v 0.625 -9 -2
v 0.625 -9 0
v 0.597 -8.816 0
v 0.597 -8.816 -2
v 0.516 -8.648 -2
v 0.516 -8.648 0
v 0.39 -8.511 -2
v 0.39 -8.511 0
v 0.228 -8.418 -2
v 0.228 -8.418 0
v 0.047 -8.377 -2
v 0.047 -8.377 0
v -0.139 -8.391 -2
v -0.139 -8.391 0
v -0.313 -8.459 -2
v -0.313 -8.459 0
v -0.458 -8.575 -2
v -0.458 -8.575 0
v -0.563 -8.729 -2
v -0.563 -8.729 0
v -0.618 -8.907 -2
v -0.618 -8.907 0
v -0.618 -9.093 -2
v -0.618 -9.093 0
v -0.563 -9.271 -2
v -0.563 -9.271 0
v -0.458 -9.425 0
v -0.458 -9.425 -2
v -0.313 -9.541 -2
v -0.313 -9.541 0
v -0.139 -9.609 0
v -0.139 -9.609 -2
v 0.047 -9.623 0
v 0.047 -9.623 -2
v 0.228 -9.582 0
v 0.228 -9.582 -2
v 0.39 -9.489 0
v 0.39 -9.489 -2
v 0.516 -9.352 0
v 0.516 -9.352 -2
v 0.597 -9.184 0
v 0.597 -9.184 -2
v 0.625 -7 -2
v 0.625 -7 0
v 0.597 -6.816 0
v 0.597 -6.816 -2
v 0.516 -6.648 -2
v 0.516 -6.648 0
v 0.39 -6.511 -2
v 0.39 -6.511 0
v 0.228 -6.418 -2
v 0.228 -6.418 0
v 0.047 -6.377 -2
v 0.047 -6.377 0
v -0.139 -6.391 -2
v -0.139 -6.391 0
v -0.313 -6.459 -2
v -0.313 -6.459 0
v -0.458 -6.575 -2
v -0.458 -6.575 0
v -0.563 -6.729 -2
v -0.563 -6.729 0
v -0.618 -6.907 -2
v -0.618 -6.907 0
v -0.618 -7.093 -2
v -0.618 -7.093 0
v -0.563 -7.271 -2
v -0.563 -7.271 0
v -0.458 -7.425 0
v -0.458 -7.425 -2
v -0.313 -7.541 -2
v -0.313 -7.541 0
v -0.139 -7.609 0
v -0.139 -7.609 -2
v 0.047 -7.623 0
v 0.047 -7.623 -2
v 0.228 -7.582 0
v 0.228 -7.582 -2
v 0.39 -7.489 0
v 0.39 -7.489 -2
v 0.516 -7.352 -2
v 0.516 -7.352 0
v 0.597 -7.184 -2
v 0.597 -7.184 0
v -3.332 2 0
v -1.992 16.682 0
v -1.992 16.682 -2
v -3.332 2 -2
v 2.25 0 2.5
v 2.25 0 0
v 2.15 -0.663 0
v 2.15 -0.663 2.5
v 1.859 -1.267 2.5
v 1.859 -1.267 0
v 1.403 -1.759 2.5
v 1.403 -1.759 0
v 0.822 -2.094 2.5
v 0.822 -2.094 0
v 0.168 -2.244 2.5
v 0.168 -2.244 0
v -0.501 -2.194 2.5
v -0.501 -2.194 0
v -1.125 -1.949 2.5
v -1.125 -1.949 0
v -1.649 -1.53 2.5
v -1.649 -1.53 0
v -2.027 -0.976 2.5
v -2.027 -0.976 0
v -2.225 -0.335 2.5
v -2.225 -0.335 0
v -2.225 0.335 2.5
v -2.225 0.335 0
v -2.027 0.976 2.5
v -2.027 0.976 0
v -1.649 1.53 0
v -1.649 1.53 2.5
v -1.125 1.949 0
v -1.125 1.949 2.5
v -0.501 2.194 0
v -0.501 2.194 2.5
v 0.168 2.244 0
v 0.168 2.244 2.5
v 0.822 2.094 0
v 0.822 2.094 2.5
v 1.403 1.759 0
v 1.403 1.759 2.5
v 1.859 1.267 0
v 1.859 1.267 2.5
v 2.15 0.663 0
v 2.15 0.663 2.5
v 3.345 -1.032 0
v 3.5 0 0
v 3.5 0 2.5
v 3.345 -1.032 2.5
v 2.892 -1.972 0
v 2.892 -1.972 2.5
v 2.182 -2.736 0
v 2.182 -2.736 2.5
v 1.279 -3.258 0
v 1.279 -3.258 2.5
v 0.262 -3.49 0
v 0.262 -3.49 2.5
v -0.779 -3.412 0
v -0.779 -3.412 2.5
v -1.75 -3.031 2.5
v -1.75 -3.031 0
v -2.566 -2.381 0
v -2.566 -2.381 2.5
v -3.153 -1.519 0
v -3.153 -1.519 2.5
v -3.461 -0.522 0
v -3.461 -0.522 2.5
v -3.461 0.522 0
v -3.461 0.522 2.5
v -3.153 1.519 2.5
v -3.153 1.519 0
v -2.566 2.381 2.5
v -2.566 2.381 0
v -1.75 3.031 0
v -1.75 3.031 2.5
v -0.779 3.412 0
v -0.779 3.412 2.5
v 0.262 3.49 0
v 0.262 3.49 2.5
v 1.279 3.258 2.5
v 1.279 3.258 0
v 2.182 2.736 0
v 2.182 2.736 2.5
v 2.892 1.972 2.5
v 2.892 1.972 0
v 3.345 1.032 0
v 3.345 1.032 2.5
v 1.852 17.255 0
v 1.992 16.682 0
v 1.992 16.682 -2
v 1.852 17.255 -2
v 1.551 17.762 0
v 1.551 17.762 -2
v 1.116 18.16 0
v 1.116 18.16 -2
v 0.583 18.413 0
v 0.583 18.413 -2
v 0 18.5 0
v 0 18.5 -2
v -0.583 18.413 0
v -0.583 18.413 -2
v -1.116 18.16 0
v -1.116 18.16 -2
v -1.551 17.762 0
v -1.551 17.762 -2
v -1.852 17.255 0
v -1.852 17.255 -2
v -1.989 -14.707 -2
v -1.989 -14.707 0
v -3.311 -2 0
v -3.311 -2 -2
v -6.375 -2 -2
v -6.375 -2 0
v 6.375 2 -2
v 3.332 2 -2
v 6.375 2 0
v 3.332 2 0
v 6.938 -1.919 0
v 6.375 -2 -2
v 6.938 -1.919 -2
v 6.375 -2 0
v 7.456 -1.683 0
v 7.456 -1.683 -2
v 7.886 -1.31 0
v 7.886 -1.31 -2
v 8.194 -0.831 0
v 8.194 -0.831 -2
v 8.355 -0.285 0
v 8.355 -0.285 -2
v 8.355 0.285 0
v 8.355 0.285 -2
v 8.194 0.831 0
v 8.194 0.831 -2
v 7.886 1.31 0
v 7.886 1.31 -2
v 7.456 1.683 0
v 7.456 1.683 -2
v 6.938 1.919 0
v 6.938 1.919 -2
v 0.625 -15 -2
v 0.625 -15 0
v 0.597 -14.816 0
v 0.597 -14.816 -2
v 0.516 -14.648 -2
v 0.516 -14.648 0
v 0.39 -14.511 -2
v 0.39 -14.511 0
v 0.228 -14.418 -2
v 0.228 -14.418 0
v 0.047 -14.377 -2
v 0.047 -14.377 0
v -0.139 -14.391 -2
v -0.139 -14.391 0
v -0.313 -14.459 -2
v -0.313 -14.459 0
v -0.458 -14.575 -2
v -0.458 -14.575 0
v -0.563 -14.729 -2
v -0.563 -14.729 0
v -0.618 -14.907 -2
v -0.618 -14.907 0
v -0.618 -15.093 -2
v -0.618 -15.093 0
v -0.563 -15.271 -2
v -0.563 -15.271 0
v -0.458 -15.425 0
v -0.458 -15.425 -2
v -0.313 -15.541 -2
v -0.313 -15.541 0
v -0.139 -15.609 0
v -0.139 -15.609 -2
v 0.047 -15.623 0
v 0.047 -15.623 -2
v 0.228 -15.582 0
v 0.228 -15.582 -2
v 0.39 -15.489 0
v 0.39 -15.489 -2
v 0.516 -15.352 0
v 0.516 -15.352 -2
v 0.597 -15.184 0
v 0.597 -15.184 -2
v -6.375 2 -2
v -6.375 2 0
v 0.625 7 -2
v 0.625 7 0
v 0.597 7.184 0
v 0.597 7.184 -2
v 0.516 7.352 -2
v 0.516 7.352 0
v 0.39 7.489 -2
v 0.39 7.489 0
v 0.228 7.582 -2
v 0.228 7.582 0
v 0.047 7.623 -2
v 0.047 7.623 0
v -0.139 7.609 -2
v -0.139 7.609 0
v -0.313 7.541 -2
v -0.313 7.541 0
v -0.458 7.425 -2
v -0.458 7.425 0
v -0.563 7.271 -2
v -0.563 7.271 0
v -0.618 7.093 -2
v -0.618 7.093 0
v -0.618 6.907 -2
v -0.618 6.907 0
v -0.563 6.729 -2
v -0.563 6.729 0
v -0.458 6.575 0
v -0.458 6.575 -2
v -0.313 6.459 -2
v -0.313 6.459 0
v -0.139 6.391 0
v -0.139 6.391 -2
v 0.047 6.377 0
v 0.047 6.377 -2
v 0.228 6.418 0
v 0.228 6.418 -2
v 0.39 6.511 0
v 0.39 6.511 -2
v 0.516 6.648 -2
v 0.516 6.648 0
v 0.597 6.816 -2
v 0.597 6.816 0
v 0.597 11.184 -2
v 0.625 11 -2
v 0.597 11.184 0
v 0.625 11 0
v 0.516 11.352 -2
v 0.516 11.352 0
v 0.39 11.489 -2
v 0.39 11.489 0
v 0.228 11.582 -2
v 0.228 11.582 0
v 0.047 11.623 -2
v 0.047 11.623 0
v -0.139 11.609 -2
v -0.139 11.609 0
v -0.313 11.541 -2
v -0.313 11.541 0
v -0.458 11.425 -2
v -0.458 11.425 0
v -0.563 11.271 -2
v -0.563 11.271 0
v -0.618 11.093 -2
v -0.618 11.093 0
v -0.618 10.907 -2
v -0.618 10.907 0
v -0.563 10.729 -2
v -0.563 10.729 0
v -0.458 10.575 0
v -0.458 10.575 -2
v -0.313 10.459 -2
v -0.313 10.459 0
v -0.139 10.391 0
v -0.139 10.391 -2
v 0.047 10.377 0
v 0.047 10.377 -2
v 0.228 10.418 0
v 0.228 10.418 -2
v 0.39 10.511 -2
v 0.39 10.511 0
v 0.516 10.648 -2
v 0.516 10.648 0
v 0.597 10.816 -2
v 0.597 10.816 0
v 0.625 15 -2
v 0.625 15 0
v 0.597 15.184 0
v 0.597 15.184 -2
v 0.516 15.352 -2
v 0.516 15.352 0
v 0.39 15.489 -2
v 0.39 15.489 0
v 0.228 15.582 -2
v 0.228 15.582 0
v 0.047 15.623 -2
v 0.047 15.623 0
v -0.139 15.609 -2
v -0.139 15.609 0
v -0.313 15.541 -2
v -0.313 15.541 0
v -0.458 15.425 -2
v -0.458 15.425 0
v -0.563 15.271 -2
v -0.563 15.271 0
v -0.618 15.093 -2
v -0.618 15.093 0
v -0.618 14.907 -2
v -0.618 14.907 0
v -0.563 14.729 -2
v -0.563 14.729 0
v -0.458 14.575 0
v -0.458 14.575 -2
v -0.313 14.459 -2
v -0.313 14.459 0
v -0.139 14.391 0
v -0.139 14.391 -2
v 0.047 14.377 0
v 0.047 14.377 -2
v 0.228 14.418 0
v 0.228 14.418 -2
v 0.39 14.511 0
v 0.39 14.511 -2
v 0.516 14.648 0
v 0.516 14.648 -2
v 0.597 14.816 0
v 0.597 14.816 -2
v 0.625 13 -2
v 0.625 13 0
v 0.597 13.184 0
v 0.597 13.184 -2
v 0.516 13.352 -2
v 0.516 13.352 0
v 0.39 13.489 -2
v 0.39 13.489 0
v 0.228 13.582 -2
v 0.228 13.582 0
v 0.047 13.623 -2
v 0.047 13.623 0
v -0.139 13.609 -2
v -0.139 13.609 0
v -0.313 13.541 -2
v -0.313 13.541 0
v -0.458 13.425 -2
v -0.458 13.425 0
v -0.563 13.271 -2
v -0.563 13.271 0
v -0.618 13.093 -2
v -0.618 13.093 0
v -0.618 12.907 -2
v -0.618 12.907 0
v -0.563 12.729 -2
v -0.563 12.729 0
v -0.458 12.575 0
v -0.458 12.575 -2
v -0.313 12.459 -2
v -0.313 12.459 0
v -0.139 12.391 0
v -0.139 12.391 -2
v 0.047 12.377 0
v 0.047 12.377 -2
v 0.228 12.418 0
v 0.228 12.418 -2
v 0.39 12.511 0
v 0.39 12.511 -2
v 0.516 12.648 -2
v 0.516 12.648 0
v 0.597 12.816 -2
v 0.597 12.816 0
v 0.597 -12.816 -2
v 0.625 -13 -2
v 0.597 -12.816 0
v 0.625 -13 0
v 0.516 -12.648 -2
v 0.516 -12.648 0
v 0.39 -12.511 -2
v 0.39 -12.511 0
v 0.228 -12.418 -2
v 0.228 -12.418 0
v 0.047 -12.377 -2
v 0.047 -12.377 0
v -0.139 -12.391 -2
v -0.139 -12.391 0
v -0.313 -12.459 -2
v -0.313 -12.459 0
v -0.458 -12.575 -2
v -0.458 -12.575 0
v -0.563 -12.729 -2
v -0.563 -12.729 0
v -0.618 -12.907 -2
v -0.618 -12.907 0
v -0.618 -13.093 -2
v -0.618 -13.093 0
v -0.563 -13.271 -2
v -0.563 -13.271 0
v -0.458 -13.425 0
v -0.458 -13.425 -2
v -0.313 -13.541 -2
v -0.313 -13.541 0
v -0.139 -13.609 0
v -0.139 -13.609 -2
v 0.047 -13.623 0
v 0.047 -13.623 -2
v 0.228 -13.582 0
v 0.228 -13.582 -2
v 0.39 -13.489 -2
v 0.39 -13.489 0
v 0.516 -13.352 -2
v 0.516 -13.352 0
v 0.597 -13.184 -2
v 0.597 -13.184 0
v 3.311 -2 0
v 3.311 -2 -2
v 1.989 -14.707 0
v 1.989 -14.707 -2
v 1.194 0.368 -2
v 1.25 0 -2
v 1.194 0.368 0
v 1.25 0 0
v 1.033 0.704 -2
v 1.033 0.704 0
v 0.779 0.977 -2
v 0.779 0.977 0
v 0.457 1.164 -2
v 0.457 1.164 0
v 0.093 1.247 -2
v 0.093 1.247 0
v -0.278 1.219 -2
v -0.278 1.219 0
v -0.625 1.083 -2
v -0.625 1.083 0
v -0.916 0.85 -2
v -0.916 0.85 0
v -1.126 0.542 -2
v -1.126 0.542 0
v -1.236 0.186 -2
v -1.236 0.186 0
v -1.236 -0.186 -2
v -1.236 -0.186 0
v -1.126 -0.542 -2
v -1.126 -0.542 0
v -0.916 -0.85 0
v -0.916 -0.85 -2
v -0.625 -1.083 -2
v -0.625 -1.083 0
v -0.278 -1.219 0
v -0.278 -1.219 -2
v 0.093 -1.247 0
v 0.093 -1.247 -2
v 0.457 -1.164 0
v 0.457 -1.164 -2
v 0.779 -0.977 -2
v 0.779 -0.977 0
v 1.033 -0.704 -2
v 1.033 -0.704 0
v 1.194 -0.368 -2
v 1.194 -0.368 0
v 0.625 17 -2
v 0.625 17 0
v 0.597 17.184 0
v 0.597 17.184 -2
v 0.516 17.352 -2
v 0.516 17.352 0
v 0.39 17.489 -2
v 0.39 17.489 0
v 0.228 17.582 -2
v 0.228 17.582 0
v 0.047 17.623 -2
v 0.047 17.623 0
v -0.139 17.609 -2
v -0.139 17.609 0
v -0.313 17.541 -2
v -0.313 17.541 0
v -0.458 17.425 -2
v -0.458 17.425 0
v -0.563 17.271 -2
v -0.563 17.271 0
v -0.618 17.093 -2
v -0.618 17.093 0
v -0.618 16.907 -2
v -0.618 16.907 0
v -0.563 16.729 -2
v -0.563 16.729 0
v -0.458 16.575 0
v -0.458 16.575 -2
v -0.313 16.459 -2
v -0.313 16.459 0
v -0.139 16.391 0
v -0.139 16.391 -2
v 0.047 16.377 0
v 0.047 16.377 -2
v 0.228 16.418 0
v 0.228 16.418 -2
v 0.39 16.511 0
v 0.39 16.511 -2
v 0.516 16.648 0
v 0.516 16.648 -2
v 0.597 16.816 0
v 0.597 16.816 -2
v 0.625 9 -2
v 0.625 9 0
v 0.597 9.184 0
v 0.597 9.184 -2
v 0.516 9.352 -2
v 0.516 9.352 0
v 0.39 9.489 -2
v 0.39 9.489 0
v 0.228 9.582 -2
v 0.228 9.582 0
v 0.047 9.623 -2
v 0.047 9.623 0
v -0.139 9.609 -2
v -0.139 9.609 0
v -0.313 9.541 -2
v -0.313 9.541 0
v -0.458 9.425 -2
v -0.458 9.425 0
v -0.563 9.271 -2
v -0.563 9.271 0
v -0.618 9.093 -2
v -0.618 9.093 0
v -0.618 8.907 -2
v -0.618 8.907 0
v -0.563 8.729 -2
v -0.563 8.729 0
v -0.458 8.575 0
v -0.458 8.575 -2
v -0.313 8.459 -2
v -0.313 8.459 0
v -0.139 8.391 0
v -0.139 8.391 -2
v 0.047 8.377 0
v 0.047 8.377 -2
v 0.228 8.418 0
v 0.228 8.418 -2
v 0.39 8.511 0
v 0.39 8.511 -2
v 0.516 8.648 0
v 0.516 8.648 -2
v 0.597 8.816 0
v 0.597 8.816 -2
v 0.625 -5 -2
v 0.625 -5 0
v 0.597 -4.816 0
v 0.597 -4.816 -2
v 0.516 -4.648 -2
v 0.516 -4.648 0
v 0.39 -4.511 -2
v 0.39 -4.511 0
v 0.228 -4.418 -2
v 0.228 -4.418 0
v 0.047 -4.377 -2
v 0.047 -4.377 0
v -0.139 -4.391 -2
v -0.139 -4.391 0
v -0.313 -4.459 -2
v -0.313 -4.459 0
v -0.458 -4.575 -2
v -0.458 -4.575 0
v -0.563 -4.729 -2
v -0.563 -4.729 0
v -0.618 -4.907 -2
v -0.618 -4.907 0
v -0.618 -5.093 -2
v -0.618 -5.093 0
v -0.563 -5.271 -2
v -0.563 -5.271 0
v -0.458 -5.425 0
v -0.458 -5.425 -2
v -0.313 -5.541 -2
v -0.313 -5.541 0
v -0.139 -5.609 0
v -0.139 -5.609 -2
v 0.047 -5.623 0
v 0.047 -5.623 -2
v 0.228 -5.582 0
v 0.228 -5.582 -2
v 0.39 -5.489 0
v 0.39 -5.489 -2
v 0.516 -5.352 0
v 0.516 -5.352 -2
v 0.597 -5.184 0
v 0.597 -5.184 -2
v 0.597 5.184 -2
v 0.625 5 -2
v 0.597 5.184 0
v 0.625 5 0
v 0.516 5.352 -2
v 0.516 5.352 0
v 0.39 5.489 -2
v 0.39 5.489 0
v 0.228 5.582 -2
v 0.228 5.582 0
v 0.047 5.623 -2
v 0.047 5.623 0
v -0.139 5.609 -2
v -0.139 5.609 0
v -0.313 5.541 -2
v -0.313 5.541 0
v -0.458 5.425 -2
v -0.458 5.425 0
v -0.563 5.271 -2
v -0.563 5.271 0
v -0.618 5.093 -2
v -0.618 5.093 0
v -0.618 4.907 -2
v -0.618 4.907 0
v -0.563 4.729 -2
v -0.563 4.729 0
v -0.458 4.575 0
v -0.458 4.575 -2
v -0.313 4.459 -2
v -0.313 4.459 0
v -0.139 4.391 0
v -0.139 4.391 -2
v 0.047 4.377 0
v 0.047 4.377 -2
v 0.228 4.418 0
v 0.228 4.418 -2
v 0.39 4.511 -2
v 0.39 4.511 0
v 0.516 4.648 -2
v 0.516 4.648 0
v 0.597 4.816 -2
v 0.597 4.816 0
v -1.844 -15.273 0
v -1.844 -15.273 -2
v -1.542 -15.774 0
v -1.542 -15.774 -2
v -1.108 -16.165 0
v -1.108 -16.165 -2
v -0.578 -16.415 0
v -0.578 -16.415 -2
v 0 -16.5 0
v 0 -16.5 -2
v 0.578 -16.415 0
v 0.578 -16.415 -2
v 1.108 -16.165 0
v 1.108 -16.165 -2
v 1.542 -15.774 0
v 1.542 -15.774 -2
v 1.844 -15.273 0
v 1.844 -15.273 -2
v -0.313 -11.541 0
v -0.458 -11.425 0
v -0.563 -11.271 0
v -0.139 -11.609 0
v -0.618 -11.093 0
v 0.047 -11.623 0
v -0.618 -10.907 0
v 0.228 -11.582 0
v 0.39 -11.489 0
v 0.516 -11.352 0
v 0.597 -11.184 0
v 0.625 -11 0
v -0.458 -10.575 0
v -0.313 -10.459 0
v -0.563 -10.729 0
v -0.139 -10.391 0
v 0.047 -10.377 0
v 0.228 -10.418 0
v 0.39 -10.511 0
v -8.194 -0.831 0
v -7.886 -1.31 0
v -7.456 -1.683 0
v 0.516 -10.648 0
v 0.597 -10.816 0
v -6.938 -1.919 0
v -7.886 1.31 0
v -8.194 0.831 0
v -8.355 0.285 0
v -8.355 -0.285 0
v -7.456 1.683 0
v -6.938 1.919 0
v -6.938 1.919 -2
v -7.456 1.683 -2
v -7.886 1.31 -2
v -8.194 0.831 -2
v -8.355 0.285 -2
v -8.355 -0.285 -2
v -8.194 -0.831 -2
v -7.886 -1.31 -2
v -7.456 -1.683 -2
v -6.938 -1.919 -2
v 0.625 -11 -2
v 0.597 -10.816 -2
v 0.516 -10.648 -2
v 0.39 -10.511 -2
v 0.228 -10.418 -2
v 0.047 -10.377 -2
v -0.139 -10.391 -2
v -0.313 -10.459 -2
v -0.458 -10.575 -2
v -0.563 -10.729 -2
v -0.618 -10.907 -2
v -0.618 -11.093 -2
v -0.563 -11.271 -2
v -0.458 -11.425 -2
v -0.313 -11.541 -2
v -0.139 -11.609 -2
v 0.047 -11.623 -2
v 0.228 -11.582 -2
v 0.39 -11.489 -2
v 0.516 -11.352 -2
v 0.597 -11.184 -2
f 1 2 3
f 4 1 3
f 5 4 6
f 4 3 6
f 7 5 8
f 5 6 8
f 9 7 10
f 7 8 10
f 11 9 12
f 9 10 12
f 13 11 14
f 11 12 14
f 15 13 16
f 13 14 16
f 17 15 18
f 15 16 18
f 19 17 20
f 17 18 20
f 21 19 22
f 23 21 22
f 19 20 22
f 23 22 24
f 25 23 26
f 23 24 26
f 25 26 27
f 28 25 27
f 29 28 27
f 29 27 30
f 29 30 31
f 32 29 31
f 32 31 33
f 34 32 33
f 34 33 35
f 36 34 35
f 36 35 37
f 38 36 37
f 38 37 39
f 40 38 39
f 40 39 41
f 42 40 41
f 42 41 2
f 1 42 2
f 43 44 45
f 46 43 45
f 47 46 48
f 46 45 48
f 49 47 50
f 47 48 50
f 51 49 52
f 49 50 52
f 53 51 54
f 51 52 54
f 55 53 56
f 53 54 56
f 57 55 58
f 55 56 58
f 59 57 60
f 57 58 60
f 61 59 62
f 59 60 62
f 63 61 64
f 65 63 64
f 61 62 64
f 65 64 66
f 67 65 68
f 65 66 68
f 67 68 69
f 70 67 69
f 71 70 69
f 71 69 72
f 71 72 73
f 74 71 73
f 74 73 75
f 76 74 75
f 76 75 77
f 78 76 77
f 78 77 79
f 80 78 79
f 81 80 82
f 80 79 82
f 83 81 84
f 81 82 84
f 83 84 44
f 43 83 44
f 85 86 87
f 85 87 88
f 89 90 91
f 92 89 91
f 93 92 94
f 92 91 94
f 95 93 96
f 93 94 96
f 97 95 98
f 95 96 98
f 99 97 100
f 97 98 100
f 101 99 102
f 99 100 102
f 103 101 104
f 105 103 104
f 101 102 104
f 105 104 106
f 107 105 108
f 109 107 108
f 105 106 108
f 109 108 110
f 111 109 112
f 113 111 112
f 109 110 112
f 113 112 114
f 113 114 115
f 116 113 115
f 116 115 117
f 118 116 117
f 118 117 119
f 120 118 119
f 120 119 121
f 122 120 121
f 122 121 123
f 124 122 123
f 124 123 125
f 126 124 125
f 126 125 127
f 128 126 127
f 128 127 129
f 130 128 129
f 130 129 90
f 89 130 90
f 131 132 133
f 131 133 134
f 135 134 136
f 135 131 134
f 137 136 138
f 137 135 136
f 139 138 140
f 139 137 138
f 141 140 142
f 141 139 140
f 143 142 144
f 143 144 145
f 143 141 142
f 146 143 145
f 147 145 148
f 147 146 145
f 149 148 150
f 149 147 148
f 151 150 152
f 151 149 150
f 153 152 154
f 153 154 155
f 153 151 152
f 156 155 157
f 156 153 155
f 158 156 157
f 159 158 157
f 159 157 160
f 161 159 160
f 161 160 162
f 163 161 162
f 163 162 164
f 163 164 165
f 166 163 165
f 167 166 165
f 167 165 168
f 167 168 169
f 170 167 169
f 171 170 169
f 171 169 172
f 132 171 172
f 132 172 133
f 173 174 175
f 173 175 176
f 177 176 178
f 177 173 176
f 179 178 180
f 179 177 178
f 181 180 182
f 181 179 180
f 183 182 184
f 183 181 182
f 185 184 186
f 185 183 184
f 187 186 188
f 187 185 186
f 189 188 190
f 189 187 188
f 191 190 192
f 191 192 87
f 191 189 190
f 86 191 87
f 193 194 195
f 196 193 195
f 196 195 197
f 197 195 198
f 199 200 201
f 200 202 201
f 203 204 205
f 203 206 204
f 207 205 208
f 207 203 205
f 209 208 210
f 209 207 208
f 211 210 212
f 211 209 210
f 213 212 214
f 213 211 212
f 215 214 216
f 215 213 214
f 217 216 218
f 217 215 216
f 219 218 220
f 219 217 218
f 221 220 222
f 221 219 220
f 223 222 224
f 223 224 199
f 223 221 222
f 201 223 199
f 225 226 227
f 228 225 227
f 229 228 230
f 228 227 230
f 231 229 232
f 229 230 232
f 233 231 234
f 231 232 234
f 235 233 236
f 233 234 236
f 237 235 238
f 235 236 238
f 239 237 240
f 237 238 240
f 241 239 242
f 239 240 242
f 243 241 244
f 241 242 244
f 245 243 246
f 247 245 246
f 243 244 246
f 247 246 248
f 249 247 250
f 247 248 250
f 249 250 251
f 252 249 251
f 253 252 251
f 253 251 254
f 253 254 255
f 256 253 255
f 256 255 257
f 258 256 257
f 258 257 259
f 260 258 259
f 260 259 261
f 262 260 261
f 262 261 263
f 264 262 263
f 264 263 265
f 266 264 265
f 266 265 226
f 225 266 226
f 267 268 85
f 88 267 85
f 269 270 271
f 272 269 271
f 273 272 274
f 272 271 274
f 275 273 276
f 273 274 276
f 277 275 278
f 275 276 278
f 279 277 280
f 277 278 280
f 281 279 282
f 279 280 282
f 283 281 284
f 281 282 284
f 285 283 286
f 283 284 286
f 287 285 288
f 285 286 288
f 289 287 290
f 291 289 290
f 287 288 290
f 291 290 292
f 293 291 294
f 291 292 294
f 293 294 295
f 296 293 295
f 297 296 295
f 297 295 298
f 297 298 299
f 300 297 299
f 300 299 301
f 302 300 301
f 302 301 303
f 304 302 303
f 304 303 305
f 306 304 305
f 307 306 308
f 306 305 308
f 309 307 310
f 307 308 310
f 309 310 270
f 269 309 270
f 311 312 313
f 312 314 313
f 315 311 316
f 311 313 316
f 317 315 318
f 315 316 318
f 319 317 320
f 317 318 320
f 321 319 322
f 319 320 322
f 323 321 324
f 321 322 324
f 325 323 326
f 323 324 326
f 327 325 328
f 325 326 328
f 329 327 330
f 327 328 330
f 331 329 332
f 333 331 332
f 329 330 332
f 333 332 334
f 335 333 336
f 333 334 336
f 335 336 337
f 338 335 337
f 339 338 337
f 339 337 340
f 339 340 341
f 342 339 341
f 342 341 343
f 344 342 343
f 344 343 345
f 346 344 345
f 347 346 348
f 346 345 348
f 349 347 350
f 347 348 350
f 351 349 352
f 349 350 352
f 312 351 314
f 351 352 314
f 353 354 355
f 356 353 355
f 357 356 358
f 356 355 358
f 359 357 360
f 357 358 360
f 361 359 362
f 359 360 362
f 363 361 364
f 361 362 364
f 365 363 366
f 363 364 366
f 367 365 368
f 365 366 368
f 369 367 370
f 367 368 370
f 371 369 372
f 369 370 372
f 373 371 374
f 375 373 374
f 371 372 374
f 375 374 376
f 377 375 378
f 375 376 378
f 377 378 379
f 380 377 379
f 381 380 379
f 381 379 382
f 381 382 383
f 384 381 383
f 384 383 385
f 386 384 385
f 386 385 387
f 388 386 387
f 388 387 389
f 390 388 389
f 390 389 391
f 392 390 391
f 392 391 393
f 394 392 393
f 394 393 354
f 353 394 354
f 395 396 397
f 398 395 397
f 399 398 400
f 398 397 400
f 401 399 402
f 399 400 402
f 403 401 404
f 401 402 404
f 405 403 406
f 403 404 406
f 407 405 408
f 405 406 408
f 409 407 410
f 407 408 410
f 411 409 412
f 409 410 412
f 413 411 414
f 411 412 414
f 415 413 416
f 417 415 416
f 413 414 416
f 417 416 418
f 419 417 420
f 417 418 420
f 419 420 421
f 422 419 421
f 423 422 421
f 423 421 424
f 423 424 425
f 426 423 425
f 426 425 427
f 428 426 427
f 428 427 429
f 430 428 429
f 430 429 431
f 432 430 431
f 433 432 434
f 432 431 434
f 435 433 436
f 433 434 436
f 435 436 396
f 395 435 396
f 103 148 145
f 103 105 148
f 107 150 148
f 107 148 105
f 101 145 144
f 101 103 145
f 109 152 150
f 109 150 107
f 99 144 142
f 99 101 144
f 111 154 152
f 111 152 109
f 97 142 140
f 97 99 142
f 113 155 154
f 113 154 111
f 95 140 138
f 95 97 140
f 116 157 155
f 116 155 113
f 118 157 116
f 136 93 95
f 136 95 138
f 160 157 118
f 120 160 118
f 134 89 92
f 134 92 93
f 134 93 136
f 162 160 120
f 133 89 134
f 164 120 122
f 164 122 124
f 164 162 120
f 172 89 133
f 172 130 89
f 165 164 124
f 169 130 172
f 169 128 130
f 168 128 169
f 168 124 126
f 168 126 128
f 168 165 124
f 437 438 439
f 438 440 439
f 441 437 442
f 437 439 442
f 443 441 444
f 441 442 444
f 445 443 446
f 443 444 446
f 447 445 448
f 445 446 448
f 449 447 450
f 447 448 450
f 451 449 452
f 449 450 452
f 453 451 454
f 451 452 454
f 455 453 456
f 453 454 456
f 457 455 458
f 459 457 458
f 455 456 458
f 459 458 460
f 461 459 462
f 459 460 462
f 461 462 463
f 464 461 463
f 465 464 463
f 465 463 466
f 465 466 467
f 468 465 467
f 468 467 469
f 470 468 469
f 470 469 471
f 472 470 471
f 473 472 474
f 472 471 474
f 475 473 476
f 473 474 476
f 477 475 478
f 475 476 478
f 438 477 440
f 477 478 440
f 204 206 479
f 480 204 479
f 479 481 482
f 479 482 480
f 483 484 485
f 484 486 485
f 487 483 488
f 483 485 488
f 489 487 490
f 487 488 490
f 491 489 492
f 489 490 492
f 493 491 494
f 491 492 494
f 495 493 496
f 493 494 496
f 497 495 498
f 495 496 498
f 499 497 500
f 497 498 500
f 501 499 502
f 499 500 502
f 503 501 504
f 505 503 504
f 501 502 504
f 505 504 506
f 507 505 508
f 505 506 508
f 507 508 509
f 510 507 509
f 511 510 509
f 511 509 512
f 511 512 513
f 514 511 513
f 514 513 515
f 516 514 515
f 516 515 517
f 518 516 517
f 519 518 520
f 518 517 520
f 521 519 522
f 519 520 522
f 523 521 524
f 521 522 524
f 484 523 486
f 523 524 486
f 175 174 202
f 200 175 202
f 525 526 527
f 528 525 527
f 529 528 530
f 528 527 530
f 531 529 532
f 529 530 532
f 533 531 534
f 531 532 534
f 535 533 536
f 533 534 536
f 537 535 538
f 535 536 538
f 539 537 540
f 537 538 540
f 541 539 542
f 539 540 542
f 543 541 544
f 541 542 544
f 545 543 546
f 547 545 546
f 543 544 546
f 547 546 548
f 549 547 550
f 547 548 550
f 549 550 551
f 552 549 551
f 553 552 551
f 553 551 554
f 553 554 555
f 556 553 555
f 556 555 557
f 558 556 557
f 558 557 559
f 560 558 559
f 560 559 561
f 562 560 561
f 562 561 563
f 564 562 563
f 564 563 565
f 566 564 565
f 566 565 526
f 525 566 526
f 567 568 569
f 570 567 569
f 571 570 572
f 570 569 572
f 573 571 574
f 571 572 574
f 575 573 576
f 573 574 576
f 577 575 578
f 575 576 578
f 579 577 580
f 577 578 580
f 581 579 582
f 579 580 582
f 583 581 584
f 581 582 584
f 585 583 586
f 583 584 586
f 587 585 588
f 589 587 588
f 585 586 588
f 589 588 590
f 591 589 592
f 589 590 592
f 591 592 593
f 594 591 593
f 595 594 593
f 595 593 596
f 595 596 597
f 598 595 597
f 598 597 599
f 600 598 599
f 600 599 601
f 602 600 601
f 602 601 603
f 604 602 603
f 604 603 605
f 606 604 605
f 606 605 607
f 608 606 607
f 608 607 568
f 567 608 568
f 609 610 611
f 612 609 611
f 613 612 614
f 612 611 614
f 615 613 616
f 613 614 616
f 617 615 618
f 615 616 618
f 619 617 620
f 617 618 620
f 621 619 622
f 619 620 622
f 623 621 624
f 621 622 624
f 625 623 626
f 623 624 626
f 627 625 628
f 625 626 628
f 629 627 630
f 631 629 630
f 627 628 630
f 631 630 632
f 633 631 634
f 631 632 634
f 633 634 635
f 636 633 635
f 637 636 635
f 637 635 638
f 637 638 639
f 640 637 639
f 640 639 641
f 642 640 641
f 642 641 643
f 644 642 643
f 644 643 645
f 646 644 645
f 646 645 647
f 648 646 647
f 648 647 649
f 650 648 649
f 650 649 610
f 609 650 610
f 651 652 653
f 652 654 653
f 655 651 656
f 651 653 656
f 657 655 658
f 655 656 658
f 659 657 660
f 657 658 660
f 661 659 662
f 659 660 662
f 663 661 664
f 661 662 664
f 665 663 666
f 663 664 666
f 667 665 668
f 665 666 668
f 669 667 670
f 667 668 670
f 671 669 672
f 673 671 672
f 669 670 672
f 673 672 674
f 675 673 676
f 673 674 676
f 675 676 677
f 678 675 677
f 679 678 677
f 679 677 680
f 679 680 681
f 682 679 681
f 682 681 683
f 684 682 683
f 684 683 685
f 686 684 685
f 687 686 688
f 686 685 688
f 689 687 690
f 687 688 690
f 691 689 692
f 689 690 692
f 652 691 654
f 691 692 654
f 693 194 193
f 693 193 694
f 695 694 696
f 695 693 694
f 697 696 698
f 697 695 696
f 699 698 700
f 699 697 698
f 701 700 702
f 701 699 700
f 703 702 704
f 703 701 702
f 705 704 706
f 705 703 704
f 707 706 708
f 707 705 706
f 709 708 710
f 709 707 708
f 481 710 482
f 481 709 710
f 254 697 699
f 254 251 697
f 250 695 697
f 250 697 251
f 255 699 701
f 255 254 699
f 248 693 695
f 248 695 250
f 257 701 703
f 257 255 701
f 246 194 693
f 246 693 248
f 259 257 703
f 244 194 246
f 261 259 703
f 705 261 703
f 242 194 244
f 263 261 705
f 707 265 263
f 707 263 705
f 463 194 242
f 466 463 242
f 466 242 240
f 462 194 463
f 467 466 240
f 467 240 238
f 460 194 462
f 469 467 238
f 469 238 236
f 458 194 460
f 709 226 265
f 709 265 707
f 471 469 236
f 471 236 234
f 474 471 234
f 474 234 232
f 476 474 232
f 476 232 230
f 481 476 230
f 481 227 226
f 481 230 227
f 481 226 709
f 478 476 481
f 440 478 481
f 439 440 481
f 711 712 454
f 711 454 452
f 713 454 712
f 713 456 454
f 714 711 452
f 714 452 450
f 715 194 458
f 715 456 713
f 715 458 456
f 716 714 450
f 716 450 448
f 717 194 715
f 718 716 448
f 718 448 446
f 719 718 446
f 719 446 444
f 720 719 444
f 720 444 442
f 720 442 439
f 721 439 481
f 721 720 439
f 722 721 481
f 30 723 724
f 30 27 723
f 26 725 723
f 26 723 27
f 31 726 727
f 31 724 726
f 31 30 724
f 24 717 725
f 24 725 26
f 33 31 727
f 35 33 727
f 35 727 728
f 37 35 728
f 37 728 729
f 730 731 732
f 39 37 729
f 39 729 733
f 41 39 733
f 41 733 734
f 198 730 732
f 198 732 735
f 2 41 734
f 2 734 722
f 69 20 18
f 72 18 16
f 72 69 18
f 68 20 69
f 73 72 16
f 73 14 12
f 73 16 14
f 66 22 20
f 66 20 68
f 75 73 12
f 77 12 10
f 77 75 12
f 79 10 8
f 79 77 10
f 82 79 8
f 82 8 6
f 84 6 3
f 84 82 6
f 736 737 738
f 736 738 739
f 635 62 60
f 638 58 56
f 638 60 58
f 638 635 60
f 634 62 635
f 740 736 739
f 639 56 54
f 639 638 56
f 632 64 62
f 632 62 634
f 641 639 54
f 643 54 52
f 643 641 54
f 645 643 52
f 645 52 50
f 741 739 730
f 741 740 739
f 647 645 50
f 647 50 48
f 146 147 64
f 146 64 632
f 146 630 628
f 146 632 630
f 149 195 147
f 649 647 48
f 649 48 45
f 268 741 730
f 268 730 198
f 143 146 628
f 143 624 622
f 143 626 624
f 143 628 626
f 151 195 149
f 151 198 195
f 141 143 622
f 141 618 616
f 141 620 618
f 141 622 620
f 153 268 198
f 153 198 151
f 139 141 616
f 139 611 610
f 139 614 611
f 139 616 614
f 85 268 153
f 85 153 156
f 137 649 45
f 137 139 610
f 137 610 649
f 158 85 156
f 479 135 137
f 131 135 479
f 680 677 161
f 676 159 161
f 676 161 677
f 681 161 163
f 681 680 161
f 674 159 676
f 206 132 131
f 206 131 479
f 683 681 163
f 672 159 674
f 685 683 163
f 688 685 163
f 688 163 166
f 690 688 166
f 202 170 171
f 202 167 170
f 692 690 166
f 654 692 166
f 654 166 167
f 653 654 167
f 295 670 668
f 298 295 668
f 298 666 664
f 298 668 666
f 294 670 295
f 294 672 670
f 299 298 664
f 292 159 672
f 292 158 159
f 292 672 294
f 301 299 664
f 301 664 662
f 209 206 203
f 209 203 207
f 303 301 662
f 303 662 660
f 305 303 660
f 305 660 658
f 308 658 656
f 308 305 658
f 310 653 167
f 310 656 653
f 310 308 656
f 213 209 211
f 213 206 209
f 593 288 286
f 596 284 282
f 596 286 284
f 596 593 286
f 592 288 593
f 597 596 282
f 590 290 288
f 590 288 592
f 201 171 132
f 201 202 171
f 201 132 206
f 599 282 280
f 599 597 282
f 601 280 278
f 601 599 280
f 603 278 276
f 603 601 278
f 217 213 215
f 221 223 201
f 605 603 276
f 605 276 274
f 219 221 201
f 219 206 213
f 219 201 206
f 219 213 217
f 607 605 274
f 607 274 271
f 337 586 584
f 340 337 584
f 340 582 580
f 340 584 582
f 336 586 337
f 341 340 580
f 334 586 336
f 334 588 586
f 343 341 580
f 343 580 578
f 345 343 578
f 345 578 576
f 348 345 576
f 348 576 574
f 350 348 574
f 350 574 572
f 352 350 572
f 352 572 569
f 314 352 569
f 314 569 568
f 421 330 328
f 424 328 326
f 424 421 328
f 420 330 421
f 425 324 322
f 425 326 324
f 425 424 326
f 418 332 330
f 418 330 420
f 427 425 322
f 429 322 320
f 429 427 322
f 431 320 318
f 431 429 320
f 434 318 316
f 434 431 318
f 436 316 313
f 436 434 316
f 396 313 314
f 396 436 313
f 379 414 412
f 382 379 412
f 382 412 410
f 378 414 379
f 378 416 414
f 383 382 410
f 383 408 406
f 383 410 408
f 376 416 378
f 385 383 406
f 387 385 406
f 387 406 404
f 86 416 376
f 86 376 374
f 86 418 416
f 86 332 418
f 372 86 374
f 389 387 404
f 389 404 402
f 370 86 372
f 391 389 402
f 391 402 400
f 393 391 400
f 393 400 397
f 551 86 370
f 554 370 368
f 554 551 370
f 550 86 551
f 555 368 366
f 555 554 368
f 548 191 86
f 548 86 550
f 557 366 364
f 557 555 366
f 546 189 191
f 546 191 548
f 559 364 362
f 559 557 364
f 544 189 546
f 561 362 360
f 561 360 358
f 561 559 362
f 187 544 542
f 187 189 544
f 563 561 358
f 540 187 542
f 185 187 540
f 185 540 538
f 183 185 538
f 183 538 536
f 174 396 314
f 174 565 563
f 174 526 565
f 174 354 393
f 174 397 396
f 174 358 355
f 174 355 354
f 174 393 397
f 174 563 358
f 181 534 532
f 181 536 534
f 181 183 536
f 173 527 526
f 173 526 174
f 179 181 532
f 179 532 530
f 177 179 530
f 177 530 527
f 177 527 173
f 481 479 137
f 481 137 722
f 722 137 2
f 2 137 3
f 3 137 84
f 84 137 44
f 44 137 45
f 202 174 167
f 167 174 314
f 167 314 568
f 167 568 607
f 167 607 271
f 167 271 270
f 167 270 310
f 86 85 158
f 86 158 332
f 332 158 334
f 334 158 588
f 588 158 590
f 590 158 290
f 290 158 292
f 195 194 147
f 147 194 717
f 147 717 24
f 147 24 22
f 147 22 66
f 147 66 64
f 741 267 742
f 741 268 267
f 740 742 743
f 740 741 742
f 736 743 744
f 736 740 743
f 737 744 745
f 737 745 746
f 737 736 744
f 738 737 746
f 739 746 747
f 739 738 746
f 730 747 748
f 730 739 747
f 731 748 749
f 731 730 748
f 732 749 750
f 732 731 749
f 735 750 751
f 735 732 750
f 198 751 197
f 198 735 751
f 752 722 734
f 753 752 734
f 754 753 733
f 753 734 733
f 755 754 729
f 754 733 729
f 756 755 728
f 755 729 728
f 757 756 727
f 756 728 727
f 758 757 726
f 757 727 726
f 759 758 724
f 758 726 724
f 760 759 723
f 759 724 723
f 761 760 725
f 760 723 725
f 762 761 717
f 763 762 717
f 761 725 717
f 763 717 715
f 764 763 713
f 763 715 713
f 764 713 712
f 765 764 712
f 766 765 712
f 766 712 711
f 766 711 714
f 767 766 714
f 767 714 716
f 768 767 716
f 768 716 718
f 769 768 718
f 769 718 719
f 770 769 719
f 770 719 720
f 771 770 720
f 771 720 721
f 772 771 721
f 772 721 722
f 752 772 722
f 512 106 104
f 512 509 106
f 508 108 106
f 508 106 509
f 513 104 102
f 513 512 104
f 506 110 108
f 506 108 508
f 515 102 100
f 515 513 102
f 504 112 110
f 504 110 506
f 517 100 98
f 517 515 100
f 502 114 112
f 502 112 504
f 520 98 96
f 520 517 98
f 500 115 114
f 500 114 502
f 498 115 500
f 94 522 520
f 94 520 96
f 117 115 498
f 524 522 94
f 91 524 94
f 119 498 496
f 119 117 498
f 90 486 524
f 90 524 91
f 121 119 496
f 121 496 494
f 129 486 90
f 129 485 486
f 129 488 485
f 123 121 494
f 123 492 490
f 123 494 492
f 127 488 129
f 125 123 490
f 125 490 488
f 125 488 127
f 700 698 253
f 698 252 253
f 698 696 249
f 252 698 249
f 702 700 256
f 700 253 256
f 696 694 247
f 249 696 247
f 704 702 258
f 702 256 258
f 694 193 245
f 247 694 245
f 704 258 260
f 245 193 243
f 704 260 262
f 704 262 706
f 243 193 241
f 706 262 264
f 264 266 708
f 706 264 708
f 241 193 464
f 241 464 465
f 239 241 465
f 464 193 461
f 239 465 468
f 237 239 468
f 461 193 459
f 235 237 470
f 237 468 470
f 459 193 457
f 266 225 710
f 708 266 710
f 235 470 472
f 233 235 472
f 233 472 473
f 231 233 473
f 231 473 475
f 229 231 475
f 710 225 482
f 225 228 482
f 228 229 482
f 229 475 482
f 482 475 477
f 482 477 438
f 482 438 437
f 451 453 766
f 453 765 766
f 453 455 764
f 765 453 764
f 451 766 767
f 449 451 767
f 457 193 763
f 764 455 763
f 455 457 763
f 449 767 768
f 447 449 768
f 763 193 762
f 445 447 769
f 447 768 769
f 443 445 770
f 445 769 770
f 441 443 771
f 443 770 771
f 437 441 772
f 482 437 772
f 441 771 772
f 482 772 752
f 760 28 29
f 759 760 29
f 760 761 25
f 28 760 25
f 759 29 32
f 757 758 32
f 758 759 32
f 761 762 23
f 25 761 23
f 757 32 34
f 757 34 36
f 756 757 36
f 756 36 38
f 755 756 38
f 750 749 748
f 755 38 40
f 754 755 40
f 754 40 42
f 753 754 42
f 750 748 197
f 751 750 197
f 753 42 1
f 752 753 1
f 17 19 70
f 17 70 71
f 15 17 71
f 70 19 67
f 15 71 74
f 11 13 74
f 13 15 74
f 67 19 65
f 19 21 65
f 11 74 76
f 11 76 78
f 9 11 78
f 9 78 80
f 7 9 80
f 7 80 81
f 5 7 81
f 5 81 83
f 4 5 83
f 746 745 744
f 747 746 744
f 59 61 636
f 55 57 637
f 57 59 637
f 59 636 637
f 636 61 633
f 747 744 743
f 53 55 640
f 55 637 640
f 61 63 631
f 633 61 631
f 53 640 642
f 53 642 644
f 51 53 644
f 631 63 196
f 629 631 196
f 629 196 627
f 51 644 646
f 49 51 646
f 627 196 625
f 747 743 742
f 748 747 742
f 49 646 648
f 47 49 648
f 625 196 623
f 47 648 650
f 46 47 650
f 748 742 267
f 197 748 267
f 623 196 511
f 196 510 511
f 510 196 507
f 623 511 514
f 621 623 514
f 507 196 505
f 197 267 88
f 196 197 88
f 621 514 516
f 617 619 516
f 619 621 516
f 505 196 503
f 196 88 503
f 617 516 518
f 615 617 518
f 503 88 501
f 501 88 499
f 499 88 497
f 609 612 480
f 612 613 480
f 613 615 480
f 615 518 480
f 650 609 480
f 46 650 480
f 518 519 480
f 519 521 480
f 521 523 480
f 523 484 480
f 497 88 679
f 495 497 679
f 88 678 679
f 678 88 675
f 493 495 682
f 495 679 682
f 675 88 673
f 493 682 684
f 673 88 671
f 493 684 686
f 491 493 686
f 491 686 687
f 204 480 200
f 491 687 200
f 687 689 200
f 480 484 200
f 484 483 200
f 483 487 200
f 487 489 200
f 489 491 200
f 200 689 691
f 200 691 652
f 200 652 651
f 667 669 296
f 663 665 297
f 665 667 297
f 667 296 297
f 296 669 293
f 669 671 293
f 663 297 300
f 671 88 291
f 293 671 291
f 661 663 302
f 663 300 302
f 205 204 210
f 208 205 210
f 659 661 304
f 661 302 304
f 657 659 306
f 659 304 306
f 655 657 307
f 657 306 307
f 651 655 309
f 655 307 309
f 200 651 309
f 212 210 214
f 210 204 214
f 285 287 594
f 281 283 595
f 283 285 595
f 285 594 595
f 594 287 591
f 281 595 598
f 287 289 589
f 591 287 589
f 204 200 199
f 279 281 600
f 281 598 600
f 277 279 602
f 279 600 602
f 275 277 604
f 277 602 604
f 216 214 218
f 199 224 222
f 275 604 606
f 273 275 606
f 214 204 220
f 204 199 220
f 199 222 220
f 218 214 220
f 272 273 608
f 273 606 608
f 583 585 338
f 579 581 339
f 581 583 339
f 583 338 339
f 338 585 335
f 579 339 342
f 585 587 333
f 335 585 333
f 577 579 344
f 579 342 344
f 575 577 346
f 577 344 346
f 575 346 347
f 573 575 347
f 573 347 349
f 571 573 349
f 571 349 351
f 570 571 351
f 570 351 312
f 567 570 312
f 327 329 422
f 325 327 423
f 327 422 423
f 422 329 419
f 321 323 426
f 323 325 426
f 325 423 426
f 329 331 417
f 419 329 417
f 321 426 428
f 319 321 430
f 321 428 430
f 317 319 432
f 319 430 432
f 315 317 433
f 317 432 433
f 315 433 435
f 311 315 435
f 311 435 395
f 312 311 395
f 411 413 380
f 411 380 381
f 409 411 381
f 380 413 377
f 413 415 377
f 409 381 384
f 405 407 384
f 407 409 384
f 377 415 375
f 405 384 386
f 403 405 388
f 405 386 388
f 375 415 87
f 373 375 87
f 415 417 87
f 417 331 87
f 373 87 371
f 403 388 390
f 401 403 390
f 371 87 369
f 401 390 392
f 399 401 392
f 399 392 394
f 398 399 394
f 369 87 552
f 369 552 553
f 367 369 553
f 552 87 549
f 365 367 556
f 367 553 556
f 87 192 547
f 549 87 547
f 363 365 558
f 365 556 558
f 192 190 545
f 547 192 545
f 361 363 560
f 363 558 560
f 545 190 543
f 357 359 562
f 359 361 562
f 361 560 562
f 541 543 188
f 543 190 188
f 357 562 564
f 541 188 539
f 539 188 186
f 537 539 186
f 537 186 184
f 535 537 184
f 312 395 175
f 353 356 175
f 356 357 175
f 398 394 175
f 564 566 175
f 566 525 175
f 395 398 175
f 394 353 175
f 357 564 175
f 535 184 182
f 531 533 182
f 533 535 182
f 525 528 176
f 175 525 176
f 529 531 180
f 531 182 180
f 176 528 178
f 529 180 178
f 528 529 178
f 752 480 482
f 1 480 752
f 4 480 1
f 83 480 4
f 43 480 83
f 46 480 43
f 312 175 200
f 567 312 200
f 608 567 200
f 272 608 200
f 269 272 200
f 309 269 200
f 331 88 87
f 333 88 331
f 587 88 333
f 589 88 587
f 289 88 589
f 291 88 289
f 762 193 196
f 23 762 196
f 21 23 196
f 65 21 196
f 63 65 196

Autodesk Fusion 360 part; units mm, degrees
sketch "Sketch1" plane through (0, 0, 0) normal (0, 0, 1) x (1, 0, 0)
  circle A0 centre (0, 0) radius 3.5
  circle A1 centre (0, 0) radius 2.25
  circle A2 centre (0, 16.5) radius 2
  circle A3 centre (0, -14.5) radius 2
  circle A4 centre (-6.375, 0) radius 2
  circle A5 centre (6.375, 0) radius 2
  line L0 (0, 0) -> (0, 16.5) construction
  line L1 (-1.9917, 16.6818) -> (-3.4855, 0.3182)
  line L2 (-1.9893, -14.7069) -> (-3.4812, -0.3621)
  line L3 (1.9917, 16.6818) -> (3.4855, 0.3182)
  line L4 (1.9893, -14.7069) -> (3.4812, -0.3621)
  line L5 (-6.375, 2) -> (6.375, 2)
  line L6 (6.375, 2) -> (6.375, -2) construction
  line L7 (6.375, -2) -> (-6.375, -2)
  line L8 (-6.375, -2) -> (-6.375, 2) construction
  circle A6 centre (0, 0) radius 1.25
  circle A7 centre (0, 5) radius 0.625
  circle A8 centre (0, 7) radius 0.625
  circle A9 centre (0, 9) radius 0.625
  circle A10 centre (0, 11) radius 0.625
  circle A11 centre (0, 13) radius 0.625
  circle A12 centre (0, 15) radius 0.625
  circle A13 centre (0, 17) radius 0.625
  circle A14 centre (0, -5) radius 0.625
  circle A15 centre (0, -7) radius 0.625
  circle A16 centre (0, -9) radius 0.625
  circle A17 centre (0, -11) radius 0.625
  circle A18 centre (0, -13) radius 0.625
  circle A19 centre (0, -15) radius 0.625
  point P0 (0, -16.5)
  point P1 (0, 18.5)
  point P2 (-8.375, 0)
  point P3 (8.375, 0)
  dimension "d1" = 7
  dimension "d2" = 4.5
  dimension "d5" = 35
  dimension "d7" = 4
  dimension "d8" = 16.75
  dimension "d9" = 14.5
  dimension "d12" = 2.5
  dimension "d14" = 5
  dimension "d15" = 1.25
  dimension "d16" = 2
  dimension "d17" = 2
  dimension "d18" = 2
  dimension "d19" = 2
  dimension "d20" = 2
  dimension "d21" = 2
  dimension "d22" = 5
  dimension "d23" = 2
  dimension "d24" = 2
  dimension "d25" = 2
  dimension "d26" = 2
  dimension "d27" = 2
extrude "Extrude1" add sketch "Sketch1" along normal blind 2.5 contours A0 A1 L5 L7 | A0 A1 L5 | A0 A1 L7 | A0 A1 L5 L7
extrude "Extrude2" add sketch "Sketch1" against normal blind 2 contours A0 A1 L5 L7 | A0 A5 L3 L4 L5 L7 | A0 L3 L5 | A0 L4 L7 | A0 A1 L5 | A0 A2 L1 L3 L5 A12 | A0 A3 L2 L4 L7 A18 | A0 A1 L7 | A0 A1 L5 L7 | A0 L1 L5 | A1 L5 | A1 L5 L7 | A2 A12 | A5 | A0 L2 L7 | A1 L7 | A3 A18 | A0 A4 L1 L2 L5 L7 | A4 | A2 A12 | A2 A12 | A3 A18 | A3 A18 | A6 | A7 | A8 | A9 | A10 | A11 | A13 | A14 | A15 | A16 | A17 | A19
extrude "Extrude3" cut sketch "Sketch1" against normal through all contours A2 A12 | A2 A12 | A3 A18 | A3 A18 | A6 | A7 | A8 | A9 | A10 | A11 | A13 | A14 | A15 | A16 | A17 | A19 picked at (-0.0144, 14.4623) picked at (-0.0082, 14.8783) picked at (0.0144, -12.4623) picked at (-0.0082, -12.8783)
